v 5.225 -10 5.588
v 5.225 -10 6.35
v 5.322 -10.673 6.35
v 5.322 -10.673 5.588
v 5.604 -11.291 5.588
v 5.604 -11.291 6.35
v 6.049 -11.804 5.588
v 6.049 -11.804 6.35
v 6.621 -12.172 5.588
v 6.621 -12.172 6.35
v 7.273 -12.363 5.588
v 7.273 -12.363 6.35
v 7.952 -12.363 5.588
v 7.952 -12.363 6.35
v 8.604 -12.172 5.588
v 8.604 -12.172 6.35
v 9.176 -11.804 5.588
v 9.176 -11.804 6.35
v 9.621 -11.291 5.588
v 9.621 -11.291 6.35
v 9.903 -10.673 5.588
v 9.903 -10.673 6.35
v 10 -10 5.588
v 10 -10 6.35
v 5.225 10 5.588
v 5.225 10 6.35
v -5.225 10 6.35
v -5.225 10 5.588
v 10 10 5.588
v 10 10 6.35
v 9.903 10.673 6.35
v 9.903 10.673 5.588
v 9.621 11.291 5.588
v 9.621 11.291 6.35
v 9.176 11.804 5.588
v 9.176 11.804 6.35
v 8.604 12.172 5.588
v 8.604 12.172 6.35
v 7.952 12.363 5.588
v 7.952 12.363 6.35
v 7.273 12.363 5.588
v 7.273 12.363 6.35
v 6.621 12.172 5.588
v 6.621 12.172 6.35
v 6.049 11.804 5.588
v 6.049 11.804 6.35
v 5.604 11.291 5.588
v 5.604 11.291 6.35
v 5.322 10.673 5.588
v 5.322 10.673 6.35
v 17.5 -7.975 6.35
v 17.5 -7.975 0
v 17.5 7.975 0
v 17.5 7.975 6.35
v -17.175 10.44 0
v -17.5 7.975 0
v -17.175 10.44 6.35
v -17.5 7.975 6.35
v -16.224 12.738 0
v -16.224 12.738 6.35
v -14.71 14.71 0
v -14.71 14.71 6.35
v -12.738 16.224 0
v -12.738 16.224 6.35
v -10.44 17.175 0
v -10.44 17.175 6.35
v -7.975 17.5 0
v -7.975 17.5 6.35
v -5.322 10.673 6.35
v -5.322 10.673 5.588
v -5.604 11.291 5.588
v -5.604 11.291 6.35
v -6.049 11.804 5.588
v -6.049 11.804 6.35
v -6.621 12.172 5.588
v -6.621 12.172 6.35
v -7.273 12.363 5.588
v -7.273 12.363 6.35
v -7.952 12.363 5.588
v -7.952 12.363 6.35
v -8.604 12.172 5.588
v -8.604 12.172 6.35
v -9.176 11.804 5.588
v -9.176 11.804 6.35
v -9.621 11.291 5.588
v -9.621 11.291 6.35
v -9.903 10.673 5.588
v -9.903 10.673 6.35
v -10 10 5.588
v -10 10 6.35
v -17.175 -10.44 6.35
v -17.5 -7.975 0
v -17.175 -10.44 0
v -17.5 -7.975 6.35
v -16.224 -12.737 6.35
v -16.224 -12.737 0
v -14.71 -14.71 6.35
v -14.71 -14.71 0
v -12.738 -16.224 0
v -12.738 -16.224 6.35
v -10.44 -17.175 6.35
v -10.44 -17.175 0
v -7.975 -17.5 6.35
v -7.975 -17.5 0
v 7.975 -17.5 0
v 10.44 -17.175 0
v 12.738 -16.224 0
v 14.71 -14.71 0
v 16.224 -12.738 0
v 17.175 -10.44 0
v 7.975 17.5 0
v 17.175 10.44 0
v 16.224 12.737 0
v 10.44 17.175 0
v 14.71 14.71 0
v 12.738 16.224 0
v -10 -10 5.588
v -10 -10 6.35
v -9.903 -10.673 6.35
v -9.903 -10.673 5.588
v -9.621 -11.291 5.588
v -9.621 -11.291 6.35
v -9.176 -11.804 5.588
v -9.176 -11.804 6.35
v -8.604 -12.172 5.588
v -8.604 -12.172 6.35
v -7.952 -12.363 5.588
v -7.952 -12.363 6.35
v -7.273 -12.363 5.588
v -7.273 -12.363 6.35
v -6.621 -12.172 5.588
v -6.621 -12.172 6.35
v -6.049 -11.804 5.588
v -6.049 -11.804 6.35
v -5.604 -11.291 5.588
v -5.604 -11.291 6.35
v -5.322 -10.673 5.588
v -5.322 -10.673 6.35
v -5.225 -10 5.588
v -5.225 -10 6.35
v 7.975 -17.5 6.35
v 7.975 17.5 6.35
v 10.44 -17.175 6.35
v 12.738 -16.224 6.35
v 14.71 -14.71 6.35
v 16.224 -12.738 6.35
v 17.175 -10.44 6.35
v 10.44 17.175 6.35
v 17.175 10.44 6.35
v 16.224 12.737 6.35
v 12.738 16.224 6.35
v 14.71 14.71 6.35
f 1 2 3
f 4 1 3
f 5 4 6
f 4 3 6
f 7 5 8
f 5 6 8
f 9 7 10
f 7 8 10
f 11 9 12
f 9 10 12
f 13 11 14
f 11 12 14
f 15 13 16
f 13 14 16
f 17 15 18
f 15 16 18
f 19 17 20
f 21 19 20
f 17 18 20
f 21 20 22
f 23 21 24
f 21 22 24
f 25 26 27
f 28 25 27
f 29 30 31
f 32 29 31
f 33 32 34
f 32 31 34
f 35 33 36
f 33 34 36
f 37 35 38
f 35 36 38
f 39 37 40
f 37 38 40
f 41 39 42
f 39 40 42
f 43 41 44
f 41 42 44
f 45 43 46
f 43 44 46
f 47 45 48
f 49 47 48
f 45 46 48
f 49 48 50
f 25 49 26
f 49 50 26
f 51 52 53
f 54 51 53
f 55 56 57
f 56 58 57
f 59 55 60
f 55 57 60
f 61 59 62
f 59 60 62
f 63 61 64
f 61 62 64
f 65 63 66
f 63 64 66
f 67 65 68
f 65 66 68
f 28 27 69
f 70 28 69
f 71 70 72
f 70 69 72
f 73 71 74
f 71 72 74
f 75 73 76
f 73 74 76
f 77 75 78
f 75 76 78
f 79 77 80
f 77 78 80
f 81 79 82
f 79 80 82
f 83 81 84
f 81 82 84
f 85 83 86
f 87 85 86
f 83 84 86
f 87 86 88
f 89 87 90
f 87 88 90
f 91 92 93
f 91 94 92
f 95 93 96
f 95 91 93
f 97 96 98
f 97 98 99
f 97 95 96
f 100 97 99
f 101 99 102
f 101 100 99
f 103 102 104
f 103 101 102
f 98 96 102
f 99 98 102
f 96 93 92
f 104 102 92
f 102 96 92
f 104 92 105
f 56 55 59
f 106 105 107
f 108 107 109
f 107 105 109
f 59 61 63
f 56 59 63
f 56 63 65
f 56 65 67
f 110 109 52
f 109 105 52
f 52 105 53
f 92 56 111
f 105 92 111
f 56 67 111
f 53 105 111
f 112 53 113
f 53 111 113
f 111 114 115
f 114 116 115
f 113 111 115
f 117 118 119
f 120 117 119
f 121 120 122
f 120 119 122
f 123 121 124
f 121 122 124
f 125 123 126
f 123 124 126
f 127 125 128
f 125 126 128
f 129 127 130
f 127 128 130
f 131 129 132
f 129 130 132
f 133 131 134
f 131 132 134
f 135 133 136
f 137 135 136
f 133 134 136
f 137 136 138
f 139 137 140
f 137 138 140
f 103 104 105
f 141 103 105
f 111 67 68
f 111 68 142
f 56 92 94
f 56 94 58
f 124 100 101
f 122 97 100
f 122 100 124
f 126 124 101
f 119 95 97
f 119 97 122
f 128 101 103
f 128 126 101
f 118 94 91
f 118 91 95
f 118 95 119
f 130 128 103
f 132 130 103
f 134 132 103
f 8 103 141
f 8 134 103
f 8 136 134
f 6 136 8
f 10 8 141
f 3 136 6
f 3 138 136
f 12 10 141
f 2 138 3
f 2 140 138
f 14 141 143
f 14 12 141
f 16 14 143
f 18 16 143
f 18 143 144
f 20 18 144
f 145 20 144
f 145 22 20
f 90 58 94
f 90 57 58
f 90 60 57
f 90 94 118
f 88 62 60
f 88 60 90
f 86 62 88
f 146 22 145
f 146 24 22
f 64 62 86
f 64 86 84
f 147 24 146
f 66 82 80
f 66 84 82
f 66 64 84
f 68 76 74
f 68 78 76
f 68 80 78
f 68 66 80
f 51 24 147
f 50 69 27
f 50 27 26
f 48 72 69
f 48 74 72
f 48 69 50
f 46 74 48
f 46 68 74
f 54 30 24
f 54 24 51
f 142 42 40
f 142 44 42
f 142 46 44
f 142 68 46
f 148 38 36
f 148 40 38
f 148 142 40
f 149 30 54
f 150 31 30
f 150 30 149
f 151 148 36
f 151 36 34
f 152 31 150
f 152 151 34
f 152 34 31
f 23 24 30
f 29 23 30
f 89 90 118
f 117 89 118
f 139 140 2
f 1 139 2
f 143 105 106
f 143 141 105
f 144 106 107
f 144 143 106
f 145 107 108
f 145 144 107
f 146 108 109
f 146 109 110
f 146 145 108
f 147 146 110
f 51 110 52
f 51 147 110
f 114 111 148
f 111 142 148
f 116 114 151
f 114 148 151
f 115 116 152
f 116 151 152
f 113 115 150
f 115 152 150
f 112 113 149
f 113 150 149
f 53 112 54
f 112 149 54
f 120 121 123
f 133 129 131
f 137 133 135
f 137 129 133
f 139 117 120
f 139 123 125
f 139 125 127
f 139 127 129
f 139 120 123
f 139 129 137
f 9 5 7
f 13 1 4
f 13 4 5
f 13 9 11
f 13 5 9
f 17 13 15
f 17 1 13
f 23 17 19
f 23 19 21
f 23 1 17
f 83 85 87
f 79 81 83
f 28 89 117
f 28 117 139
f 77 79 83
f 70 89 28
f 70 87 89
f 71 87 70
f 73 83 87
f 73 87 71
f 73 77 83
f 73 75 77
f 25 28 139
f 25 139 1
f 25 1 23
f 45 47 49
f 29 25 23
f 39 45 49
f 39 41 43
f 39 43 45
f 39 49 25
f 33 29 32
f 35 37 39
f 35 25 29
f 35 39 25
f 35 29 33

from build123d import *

# Parameters (mm, degrees)
SKETCH1_W           = 35
SKETCH1_H           = 35
BOSS_EXTRUDE1_DEPTH = 6.35
CUT_EXTRUDE1_DEPTH  = 0.762
FILLET1_R           = 9.525


with BuildPart() as part:
    # Sketch1 → Boss-Extrude1 (new body)
    with BuildSketch(Plane.XY):
        Rectangle(SKETCH1_W, SKETCH1_H)
    extrude(amount=BOSS_EXTRUDE1_DEPTH)

    # Sketch3 → Cut-Extrude1 (cut)
    with BuildSketch(Plane.XY.offset(6.35)):
        with BuildLine():
            Line((-10, 10), (-10, -10))
            ThreePointArc((-10, -10), (-7.6124, -12.3876), (-5.2248, -10))
            Line((-5.2248, -10), (5.2248, -10))
            ThreePointArc((5.2248, -10), (7.6124, -12.3876), (10, -10))
            Line((10, -10), (10, 10))
            ThreePointArc((10, 10), (7.6124, 12.3876), (5.2248, 10))
            Line((5.2248, 10), (-5.2248, 10))
            ThreePointArc((-5.2248, 10), (-7.6124, 12.3876), (-10, 10))
        make_face()
    extrude(amount=-CUT_EXTRUDE1_DEPTH, mode=Mode.SUBTRACT)

    # Fillet1
    fillet1_edges = [part.edges().sort_by_distance(p)[0] for p in [
        (17.5, -17.5, 3.175),
        (-17.5, -17.5, 3.175),
        (-17.5, 17.5, 3.175),
        (17.5, 17.5, 3.175),
    ]]
    fillet(fillet1_edges, radius=FILLET1_R)


solid = part.part
